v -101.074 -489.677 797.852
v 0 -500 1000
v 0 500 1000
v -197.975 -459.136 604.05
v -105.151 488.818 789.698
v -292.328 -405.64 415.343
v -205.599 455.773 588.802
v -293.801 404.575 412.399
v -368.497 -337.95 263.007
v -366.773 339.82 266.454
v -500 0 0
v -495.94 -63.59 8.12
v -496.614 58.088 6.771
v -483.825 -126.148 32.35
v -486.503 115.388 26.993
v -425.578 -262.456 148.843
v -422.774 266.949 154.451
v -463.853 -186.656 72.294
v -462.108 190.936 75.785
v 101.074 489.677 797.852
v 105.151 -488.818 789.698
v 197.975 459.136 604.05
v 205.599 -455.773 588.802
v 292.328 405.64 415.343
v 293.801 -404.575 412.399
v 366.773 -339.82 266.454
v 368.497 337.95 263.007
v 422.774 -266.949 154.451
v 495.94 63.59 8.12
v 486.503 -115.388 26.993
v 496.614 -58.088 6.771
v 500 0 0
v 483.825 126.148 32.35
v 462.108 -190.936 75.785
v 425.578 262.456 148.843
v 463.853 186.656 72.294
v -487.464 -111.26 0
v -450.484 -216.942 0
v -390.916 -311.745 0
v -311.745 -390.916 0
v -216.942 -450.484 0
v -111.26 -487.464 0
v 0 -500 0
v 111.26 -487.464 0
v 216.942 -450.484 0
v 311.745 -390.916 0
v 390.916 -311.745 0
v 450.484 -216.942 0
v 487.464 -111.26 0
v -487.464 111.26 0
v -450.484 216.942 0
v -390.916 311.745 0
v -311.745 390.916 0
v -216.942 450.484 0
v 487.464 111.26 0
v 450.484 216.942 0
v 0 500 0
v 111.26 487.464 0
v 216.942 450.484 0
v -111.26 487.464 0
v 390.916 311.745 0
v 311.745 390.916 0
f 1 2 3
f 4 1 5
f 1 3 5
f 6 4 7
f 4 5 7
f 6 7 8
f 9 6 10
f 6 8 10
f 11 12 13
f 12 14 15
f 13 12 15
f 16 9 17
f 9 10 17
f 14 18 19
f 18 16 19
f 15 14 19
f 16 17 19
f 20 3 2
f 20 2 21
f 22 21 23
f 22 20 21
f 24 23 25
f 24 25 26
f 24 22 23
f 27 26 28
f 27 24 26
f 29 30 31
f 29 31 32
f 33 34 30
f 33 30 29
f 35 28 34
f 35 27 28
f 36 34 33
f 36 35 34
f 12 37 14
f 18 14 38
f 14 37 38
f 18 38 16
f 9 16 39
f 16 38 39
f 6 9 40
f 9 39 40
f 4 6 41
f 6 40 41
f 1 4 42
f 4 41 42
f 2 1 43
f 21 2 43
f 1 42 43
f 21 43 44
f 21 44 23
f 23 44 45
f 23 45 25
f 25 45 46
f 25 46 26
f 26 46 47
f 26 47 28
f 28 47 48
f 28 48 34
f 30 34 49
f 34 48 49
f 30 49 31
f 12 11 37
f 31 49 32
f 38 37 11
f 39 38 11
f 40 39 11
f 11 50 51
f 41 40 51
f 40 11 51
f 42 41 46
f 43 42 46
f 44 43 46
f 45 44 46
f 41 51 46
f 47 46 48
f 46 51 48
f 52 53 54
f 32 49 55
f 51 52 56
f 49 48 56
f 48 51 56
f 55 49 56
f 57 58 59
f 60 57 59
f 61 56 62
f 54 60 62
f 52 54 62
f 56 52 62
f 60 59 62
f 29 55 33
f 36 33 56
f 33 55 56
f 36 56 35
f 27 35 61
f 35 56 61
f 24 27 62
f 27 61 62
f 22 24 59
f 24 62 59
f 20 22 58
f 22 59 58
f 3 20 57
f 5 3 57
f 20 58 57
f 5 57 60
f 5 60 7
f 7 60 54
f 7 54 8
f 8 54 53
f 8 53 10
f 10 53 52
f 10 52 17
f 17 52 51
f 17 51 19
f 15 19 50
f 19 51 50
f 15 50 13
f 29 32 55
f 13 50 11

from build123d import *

# Parameters (mm, degrees)
F0_R          = 500
F3_DEPTH      = 1000
F5_DEPTH      = 500.001
F5_DEPTH_BACK = 500.001


with BuildPart() as f3:
    # F0 (on Top) → F3 (new body, through all)
    with BuildSketch(Plane.XY):
        Circle(F0_R)
    extrude(amount=F3_DEPTH)


with BuildPart() as f5:
    # F4 (on Front) → F5 (new body, two sides)
    with BuildSketch(Plane.XZ) as f5_sk:
        Polygon((0, 1000), (500, 0), (500, 1000), align=None)
    extrude(amount=-F5_DEPTH)
    extrude(f5_sk.sketch, amount=F5_DEPTH_BACK)


with BuildPart() as f6_1:
    # F6: instance of F5
    add(f5.part.mirror(Plane.YZ))


with BuildPart() as f3_1:
    add(f3.part)

    # F7: cut F5, F6_1
    add(f5.part, mode=Mode.SUBTRACT)
    add(f6_1.part, mode=Mode.SUBTRACT)


solid = f3_1.part
